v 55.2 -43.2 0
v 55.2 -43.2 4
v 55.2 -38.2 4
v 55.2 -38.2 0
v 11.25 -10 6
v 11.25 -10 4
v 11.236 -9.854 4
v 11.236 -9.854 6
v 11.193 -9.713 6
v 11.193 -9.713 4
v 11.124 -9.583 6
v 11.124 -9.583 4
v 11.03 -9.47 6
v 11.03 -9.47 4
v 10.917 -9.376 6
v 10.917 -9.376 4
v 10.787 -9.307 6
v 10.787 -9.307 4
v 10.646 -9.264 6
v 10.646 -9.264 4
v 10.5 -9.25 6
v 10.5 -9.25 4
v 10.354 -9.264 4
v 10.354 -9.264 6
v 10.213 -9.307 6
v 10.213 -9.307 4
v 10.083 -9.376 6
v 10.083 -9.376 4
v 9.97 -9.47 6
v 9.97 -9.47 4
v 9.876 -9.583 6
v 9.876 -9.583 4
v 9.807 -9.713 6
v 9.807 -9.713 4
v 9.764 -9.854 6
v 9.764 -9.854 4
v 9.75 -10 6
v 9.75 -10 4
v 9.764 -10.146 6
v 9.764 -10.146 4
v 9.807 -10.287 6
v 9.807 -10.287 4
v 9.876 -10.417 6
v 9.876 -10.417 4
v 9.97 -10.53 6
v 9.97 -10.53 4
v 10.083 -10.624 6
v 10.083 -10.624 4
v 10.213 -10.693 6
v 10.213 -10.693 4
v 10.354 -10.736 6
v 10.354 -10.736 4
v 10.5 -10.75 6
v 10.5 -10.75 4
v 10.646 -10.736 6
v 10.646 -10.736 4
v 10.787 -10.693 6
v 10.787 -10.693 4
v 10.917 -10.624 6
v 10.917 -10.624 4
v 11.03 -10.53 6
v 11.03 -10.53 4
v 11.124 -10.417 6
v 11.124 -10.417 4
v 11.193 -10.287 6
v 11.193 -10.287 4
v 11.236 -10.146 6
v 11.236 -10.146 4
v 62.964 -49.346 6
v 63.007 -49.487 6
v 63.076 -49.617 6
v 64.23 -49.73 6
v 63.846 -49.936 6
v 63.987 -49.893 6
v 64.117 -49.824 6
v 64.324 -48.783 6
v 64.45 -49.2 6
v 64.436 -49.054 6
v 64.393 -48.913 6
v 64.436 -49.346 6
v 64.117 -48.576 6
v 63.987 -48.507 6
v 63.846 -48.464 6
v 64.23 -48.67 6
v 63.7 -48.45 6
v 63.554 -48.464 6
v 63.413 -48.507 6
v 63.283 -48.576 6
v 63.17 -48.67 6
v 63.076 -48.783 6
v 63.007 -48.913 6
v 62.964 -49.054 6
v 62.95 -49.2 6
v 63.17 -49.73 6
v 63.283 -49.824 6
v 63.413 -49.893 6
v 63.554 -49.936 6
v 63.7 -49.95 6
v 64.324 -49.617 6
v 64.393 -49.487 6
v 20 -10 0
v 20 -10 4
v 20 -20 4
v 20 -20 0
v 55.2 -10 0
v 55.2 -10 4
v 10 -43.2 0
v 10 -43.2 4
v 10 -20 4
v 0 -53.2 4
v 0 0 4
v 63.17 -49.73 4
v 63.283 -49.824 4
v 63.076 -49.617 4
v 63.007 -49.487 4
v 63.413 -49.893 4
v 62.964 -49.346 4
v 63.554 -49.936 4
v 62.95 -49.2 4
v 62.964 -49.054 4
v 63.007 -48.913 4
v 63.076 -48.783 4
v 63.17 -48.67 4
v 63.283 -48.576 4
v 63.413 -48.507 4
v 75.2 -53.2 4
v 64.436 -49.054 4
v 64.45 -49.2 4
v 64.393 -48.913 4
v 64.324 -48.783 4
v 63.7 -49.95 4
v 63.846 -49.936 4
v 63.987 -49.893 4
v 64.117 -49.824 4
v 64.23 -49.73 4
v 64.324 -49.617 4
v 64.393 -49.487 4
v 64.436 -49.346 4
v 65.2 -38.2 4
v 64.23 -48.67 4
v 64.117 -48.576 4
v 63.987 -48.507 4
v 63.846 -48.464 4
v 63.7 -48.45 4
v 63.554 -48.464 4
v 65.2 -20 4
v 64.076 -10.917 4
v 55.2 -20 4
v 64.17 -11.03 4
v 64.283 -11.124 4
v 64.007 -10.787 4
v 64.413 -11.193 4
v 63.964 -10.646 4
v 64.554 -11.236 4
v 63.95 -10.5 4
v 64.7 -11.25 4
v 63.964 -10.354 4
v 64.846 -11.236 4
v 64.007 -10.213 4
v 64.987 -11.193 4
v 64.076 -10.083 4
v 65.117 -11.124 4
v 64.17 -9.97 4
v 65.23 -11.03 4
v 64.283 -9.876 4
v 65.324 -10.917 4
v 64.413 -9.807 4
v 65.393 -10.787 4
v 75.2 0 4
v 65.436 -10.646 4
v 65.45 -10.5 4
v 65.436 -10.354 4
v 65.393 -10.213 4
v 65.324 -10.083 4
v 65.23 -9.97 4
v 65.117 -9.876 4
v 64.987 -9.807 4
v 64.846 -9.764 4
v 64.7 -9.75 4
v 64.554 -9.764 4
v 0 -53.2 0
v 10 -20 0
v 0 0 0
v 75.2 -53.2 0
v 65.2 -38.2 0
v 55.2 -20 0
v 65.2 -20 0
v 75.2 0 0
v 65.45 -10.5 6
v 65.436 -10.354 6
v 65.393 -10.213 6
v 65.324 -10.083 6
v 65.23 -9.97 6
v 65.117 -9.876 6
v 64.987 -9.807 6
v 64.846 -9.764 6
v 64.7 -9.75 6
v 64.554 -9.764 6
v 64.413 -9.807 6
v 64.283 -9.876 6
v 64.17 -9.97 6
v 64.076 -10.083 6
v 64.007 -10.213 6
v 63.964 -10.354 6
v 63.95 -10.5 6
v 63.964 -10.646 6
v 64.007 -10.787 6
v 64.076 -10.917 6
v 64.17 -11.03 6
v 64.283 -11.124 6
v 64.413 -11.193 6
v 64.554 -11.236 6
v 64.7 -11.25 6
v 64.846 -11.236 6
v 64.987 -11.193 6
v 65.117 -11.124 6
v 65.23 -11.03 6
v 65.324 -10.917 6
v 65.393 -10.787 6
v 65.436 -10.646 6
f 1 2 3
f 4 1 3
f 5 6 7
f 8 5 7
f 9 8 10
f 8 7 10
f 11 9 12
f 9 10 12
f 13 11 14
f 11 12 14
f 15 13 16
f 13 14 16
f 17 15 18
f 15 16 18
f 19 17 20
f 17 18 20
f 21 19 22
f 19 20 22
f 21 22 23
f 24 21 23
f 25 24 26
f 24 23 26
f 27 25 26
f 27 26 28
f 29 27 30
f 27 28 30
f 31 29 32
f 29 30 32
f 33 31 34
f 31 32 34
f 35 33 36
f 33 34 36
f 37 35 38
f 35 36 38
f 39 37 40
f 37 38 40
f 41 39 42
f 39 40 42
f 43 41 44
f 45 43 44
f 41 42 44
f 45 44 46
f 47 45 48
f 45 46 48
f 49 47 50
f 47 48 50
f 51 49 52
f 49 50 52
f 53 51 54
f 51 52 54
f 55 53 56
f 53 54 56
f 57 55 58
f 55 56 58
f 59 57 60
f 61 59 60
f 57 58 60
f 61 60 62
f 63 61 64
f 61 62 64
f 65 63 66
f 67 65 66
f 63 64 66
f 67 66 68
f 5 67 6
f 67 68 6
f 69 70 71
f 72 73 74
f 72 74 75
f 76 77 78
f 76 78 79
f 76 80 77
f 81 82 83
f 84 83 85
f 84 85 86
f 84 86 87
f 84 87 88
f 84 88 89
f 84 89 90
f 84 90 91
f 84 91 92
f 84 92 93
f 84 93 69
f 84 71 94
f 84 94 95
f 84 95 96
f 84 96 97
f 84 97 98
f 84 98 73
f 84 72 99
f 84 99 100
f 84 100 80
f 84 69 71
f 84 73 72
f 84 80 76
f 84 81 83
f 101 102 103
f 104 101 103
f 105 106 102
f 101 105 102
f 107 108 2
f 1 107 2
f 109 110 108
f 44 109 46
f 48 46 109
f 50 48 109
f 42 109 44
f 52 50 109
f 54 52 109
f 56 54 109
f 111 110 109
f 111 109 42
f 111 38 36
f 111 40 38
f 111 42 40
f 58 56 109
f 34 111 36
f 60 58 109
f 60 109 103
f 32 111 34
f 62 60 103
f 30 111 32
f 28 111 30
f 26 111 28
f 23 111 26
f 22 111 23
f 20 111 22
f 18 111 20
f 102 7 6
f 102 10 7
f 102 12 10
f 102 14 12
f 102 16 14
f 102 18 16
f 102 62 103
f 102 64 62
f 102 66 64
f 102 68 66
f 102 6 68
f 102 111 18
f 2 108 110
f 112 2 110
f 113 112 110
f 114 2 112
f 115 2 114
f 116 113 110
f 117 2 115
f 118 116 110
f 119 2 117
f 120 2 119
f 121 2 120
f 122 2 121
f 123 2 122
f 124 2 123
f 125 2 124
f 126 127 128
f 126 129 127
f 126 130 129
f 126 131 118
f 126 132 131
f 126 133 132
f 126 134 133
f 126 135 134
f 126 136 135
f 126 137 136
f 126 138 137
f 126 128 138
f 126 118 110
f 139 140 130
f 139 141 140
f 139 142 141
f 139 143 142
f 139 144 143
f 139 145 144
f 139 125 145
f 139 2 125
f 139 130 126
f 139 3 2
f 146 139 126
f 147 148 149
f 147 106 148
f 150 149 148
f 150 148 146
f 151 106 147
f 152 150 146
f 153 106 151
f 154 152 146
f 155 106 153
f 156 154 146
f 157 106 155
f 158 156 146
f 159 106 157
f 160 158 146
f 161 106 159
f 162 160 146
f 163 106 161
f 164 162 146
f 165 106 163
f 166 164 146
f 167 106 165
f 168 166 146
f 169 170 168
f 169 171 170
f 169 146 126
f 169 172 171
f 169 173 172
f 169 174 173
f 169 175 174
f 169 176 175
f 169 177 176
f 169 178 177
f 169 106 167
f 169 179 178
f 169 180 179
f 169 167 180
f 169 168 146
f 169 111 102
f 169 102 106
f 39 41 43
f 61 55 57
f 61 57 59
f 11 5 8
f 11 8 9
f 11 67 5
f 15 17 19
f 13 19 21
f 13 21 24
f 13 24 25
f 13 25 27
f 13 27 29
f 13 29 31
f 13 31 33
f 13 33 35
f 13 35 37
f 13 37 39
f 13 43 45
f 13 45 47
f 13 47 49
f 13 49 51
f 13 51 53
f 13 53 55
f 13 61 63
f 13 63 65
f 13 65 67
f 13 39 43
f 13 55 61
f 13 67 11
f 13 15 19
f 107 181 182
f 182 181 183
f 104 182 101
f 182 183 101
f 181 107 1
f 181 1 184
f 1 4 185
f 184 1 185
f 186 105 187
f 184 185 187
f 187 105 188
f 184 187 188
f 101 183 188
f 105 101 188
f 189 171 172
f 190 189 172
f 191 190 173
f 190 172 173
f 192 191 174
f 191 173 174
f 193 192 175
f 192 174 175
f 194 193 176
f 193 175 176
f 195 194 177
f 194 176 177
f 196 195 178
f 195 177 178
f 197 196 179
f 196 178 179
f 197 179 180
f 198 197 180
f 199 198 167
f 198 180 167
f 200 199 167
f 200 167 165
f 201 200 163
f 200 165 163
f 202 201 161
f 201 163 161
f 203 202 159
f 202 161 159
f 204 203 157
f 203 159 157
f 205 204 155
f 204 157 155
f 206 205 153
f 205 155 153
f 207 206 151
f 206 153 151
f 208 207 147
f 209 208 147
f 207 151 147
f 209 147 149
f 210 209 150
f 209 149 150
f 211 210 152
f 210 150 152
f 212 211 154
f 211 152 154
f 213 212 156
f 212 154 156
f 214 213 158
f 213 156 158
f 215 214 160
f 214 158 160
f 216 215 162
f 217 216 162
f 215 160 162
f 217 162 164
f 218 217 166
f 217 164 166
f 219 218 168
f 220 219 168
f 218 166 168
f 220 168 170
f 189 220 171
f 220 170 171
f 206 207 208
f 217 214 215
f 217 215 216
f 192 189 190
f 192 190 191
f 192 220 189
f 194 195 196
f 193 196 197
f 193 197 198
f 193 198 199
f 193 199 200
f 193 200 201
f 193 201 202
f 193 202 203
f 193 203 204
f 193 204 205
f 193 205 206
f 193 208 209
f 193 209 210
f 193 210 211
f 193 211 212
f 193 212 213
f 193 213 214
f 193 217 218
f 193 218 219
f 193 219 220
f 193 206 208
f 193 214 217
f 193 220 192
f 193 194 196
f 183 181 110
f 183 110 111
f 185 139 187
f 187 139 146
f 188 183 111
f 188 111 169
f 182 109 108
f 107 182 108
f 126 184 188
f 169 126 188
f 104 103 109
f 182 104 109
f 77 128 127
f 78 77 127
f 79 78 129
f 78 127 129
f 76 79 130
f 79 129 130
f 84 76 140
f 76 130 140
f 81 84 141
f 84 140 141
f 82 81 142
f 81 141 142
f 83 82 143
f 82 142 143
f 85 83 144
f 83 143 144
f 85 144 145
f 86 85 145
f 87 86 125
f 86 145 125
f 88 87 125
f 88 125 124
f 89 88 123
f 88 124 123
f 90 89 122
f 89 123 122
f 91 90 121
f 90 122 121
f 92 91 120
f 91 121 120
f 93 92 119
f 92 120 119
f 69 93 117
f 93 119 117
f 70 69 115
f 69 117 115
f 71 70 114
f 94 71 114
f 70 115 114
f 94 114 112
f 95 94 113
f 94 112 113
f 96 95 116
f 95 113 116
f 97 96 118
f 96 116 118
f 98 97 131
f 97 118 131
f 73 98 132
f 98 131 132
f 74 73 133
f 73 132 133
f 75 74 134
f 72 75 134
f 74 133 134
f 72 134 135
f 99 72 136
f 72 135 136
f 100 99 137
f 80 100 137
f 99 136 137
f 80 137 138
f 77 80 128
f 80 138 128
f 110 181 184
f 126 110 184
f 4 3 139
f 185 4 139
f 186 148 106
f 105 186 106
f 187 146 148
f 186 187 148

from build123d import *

# Parameters (mm, degrees)
F0_W     = 75.2
F0_H     = 53.2
F1_DEPTH = 4
F2_R     = 0.75
F3_DEPTH = 2
F5_DEPTH = 25


with BuildPart() as f1:
    # F0 (on Top) → F1 (new body)
    with BuildSketch(Plane.XY):
        with Locations((37.6, -26.6)):
            Rectangle(F0_W, F0_H)
    extrude(amount=F1_DEPTH)

    # F2 (on face) → F3 (join)
    with BuildSketch(Plane.XY.offset(4)):
        with Locations((10.5, -10)):
            Circle(F2_R)
        with Locations((63.7, -49.2)):
            Circle(F2_R)
        with Locations((64.7, -10.5)):
            Circle(F2_R)
    extrude(amount=F3_DEPTH)

    # F4 (on face) → F5 (cut)
    with BuildSketch(Plane.XY.offset(4)):
        Polygon((20, -20), (10, -20), (10, -43.2), (55.2, -43.2), (55.2, -38.2), (65.2, -38.2), (65.2, -20), (55.2, -20), (55.2, -10), (20, -10), align=None)
    extrude(amount=-F5_DEPTH, mode=Mode.SUBTRACT)


solid = f1.part
